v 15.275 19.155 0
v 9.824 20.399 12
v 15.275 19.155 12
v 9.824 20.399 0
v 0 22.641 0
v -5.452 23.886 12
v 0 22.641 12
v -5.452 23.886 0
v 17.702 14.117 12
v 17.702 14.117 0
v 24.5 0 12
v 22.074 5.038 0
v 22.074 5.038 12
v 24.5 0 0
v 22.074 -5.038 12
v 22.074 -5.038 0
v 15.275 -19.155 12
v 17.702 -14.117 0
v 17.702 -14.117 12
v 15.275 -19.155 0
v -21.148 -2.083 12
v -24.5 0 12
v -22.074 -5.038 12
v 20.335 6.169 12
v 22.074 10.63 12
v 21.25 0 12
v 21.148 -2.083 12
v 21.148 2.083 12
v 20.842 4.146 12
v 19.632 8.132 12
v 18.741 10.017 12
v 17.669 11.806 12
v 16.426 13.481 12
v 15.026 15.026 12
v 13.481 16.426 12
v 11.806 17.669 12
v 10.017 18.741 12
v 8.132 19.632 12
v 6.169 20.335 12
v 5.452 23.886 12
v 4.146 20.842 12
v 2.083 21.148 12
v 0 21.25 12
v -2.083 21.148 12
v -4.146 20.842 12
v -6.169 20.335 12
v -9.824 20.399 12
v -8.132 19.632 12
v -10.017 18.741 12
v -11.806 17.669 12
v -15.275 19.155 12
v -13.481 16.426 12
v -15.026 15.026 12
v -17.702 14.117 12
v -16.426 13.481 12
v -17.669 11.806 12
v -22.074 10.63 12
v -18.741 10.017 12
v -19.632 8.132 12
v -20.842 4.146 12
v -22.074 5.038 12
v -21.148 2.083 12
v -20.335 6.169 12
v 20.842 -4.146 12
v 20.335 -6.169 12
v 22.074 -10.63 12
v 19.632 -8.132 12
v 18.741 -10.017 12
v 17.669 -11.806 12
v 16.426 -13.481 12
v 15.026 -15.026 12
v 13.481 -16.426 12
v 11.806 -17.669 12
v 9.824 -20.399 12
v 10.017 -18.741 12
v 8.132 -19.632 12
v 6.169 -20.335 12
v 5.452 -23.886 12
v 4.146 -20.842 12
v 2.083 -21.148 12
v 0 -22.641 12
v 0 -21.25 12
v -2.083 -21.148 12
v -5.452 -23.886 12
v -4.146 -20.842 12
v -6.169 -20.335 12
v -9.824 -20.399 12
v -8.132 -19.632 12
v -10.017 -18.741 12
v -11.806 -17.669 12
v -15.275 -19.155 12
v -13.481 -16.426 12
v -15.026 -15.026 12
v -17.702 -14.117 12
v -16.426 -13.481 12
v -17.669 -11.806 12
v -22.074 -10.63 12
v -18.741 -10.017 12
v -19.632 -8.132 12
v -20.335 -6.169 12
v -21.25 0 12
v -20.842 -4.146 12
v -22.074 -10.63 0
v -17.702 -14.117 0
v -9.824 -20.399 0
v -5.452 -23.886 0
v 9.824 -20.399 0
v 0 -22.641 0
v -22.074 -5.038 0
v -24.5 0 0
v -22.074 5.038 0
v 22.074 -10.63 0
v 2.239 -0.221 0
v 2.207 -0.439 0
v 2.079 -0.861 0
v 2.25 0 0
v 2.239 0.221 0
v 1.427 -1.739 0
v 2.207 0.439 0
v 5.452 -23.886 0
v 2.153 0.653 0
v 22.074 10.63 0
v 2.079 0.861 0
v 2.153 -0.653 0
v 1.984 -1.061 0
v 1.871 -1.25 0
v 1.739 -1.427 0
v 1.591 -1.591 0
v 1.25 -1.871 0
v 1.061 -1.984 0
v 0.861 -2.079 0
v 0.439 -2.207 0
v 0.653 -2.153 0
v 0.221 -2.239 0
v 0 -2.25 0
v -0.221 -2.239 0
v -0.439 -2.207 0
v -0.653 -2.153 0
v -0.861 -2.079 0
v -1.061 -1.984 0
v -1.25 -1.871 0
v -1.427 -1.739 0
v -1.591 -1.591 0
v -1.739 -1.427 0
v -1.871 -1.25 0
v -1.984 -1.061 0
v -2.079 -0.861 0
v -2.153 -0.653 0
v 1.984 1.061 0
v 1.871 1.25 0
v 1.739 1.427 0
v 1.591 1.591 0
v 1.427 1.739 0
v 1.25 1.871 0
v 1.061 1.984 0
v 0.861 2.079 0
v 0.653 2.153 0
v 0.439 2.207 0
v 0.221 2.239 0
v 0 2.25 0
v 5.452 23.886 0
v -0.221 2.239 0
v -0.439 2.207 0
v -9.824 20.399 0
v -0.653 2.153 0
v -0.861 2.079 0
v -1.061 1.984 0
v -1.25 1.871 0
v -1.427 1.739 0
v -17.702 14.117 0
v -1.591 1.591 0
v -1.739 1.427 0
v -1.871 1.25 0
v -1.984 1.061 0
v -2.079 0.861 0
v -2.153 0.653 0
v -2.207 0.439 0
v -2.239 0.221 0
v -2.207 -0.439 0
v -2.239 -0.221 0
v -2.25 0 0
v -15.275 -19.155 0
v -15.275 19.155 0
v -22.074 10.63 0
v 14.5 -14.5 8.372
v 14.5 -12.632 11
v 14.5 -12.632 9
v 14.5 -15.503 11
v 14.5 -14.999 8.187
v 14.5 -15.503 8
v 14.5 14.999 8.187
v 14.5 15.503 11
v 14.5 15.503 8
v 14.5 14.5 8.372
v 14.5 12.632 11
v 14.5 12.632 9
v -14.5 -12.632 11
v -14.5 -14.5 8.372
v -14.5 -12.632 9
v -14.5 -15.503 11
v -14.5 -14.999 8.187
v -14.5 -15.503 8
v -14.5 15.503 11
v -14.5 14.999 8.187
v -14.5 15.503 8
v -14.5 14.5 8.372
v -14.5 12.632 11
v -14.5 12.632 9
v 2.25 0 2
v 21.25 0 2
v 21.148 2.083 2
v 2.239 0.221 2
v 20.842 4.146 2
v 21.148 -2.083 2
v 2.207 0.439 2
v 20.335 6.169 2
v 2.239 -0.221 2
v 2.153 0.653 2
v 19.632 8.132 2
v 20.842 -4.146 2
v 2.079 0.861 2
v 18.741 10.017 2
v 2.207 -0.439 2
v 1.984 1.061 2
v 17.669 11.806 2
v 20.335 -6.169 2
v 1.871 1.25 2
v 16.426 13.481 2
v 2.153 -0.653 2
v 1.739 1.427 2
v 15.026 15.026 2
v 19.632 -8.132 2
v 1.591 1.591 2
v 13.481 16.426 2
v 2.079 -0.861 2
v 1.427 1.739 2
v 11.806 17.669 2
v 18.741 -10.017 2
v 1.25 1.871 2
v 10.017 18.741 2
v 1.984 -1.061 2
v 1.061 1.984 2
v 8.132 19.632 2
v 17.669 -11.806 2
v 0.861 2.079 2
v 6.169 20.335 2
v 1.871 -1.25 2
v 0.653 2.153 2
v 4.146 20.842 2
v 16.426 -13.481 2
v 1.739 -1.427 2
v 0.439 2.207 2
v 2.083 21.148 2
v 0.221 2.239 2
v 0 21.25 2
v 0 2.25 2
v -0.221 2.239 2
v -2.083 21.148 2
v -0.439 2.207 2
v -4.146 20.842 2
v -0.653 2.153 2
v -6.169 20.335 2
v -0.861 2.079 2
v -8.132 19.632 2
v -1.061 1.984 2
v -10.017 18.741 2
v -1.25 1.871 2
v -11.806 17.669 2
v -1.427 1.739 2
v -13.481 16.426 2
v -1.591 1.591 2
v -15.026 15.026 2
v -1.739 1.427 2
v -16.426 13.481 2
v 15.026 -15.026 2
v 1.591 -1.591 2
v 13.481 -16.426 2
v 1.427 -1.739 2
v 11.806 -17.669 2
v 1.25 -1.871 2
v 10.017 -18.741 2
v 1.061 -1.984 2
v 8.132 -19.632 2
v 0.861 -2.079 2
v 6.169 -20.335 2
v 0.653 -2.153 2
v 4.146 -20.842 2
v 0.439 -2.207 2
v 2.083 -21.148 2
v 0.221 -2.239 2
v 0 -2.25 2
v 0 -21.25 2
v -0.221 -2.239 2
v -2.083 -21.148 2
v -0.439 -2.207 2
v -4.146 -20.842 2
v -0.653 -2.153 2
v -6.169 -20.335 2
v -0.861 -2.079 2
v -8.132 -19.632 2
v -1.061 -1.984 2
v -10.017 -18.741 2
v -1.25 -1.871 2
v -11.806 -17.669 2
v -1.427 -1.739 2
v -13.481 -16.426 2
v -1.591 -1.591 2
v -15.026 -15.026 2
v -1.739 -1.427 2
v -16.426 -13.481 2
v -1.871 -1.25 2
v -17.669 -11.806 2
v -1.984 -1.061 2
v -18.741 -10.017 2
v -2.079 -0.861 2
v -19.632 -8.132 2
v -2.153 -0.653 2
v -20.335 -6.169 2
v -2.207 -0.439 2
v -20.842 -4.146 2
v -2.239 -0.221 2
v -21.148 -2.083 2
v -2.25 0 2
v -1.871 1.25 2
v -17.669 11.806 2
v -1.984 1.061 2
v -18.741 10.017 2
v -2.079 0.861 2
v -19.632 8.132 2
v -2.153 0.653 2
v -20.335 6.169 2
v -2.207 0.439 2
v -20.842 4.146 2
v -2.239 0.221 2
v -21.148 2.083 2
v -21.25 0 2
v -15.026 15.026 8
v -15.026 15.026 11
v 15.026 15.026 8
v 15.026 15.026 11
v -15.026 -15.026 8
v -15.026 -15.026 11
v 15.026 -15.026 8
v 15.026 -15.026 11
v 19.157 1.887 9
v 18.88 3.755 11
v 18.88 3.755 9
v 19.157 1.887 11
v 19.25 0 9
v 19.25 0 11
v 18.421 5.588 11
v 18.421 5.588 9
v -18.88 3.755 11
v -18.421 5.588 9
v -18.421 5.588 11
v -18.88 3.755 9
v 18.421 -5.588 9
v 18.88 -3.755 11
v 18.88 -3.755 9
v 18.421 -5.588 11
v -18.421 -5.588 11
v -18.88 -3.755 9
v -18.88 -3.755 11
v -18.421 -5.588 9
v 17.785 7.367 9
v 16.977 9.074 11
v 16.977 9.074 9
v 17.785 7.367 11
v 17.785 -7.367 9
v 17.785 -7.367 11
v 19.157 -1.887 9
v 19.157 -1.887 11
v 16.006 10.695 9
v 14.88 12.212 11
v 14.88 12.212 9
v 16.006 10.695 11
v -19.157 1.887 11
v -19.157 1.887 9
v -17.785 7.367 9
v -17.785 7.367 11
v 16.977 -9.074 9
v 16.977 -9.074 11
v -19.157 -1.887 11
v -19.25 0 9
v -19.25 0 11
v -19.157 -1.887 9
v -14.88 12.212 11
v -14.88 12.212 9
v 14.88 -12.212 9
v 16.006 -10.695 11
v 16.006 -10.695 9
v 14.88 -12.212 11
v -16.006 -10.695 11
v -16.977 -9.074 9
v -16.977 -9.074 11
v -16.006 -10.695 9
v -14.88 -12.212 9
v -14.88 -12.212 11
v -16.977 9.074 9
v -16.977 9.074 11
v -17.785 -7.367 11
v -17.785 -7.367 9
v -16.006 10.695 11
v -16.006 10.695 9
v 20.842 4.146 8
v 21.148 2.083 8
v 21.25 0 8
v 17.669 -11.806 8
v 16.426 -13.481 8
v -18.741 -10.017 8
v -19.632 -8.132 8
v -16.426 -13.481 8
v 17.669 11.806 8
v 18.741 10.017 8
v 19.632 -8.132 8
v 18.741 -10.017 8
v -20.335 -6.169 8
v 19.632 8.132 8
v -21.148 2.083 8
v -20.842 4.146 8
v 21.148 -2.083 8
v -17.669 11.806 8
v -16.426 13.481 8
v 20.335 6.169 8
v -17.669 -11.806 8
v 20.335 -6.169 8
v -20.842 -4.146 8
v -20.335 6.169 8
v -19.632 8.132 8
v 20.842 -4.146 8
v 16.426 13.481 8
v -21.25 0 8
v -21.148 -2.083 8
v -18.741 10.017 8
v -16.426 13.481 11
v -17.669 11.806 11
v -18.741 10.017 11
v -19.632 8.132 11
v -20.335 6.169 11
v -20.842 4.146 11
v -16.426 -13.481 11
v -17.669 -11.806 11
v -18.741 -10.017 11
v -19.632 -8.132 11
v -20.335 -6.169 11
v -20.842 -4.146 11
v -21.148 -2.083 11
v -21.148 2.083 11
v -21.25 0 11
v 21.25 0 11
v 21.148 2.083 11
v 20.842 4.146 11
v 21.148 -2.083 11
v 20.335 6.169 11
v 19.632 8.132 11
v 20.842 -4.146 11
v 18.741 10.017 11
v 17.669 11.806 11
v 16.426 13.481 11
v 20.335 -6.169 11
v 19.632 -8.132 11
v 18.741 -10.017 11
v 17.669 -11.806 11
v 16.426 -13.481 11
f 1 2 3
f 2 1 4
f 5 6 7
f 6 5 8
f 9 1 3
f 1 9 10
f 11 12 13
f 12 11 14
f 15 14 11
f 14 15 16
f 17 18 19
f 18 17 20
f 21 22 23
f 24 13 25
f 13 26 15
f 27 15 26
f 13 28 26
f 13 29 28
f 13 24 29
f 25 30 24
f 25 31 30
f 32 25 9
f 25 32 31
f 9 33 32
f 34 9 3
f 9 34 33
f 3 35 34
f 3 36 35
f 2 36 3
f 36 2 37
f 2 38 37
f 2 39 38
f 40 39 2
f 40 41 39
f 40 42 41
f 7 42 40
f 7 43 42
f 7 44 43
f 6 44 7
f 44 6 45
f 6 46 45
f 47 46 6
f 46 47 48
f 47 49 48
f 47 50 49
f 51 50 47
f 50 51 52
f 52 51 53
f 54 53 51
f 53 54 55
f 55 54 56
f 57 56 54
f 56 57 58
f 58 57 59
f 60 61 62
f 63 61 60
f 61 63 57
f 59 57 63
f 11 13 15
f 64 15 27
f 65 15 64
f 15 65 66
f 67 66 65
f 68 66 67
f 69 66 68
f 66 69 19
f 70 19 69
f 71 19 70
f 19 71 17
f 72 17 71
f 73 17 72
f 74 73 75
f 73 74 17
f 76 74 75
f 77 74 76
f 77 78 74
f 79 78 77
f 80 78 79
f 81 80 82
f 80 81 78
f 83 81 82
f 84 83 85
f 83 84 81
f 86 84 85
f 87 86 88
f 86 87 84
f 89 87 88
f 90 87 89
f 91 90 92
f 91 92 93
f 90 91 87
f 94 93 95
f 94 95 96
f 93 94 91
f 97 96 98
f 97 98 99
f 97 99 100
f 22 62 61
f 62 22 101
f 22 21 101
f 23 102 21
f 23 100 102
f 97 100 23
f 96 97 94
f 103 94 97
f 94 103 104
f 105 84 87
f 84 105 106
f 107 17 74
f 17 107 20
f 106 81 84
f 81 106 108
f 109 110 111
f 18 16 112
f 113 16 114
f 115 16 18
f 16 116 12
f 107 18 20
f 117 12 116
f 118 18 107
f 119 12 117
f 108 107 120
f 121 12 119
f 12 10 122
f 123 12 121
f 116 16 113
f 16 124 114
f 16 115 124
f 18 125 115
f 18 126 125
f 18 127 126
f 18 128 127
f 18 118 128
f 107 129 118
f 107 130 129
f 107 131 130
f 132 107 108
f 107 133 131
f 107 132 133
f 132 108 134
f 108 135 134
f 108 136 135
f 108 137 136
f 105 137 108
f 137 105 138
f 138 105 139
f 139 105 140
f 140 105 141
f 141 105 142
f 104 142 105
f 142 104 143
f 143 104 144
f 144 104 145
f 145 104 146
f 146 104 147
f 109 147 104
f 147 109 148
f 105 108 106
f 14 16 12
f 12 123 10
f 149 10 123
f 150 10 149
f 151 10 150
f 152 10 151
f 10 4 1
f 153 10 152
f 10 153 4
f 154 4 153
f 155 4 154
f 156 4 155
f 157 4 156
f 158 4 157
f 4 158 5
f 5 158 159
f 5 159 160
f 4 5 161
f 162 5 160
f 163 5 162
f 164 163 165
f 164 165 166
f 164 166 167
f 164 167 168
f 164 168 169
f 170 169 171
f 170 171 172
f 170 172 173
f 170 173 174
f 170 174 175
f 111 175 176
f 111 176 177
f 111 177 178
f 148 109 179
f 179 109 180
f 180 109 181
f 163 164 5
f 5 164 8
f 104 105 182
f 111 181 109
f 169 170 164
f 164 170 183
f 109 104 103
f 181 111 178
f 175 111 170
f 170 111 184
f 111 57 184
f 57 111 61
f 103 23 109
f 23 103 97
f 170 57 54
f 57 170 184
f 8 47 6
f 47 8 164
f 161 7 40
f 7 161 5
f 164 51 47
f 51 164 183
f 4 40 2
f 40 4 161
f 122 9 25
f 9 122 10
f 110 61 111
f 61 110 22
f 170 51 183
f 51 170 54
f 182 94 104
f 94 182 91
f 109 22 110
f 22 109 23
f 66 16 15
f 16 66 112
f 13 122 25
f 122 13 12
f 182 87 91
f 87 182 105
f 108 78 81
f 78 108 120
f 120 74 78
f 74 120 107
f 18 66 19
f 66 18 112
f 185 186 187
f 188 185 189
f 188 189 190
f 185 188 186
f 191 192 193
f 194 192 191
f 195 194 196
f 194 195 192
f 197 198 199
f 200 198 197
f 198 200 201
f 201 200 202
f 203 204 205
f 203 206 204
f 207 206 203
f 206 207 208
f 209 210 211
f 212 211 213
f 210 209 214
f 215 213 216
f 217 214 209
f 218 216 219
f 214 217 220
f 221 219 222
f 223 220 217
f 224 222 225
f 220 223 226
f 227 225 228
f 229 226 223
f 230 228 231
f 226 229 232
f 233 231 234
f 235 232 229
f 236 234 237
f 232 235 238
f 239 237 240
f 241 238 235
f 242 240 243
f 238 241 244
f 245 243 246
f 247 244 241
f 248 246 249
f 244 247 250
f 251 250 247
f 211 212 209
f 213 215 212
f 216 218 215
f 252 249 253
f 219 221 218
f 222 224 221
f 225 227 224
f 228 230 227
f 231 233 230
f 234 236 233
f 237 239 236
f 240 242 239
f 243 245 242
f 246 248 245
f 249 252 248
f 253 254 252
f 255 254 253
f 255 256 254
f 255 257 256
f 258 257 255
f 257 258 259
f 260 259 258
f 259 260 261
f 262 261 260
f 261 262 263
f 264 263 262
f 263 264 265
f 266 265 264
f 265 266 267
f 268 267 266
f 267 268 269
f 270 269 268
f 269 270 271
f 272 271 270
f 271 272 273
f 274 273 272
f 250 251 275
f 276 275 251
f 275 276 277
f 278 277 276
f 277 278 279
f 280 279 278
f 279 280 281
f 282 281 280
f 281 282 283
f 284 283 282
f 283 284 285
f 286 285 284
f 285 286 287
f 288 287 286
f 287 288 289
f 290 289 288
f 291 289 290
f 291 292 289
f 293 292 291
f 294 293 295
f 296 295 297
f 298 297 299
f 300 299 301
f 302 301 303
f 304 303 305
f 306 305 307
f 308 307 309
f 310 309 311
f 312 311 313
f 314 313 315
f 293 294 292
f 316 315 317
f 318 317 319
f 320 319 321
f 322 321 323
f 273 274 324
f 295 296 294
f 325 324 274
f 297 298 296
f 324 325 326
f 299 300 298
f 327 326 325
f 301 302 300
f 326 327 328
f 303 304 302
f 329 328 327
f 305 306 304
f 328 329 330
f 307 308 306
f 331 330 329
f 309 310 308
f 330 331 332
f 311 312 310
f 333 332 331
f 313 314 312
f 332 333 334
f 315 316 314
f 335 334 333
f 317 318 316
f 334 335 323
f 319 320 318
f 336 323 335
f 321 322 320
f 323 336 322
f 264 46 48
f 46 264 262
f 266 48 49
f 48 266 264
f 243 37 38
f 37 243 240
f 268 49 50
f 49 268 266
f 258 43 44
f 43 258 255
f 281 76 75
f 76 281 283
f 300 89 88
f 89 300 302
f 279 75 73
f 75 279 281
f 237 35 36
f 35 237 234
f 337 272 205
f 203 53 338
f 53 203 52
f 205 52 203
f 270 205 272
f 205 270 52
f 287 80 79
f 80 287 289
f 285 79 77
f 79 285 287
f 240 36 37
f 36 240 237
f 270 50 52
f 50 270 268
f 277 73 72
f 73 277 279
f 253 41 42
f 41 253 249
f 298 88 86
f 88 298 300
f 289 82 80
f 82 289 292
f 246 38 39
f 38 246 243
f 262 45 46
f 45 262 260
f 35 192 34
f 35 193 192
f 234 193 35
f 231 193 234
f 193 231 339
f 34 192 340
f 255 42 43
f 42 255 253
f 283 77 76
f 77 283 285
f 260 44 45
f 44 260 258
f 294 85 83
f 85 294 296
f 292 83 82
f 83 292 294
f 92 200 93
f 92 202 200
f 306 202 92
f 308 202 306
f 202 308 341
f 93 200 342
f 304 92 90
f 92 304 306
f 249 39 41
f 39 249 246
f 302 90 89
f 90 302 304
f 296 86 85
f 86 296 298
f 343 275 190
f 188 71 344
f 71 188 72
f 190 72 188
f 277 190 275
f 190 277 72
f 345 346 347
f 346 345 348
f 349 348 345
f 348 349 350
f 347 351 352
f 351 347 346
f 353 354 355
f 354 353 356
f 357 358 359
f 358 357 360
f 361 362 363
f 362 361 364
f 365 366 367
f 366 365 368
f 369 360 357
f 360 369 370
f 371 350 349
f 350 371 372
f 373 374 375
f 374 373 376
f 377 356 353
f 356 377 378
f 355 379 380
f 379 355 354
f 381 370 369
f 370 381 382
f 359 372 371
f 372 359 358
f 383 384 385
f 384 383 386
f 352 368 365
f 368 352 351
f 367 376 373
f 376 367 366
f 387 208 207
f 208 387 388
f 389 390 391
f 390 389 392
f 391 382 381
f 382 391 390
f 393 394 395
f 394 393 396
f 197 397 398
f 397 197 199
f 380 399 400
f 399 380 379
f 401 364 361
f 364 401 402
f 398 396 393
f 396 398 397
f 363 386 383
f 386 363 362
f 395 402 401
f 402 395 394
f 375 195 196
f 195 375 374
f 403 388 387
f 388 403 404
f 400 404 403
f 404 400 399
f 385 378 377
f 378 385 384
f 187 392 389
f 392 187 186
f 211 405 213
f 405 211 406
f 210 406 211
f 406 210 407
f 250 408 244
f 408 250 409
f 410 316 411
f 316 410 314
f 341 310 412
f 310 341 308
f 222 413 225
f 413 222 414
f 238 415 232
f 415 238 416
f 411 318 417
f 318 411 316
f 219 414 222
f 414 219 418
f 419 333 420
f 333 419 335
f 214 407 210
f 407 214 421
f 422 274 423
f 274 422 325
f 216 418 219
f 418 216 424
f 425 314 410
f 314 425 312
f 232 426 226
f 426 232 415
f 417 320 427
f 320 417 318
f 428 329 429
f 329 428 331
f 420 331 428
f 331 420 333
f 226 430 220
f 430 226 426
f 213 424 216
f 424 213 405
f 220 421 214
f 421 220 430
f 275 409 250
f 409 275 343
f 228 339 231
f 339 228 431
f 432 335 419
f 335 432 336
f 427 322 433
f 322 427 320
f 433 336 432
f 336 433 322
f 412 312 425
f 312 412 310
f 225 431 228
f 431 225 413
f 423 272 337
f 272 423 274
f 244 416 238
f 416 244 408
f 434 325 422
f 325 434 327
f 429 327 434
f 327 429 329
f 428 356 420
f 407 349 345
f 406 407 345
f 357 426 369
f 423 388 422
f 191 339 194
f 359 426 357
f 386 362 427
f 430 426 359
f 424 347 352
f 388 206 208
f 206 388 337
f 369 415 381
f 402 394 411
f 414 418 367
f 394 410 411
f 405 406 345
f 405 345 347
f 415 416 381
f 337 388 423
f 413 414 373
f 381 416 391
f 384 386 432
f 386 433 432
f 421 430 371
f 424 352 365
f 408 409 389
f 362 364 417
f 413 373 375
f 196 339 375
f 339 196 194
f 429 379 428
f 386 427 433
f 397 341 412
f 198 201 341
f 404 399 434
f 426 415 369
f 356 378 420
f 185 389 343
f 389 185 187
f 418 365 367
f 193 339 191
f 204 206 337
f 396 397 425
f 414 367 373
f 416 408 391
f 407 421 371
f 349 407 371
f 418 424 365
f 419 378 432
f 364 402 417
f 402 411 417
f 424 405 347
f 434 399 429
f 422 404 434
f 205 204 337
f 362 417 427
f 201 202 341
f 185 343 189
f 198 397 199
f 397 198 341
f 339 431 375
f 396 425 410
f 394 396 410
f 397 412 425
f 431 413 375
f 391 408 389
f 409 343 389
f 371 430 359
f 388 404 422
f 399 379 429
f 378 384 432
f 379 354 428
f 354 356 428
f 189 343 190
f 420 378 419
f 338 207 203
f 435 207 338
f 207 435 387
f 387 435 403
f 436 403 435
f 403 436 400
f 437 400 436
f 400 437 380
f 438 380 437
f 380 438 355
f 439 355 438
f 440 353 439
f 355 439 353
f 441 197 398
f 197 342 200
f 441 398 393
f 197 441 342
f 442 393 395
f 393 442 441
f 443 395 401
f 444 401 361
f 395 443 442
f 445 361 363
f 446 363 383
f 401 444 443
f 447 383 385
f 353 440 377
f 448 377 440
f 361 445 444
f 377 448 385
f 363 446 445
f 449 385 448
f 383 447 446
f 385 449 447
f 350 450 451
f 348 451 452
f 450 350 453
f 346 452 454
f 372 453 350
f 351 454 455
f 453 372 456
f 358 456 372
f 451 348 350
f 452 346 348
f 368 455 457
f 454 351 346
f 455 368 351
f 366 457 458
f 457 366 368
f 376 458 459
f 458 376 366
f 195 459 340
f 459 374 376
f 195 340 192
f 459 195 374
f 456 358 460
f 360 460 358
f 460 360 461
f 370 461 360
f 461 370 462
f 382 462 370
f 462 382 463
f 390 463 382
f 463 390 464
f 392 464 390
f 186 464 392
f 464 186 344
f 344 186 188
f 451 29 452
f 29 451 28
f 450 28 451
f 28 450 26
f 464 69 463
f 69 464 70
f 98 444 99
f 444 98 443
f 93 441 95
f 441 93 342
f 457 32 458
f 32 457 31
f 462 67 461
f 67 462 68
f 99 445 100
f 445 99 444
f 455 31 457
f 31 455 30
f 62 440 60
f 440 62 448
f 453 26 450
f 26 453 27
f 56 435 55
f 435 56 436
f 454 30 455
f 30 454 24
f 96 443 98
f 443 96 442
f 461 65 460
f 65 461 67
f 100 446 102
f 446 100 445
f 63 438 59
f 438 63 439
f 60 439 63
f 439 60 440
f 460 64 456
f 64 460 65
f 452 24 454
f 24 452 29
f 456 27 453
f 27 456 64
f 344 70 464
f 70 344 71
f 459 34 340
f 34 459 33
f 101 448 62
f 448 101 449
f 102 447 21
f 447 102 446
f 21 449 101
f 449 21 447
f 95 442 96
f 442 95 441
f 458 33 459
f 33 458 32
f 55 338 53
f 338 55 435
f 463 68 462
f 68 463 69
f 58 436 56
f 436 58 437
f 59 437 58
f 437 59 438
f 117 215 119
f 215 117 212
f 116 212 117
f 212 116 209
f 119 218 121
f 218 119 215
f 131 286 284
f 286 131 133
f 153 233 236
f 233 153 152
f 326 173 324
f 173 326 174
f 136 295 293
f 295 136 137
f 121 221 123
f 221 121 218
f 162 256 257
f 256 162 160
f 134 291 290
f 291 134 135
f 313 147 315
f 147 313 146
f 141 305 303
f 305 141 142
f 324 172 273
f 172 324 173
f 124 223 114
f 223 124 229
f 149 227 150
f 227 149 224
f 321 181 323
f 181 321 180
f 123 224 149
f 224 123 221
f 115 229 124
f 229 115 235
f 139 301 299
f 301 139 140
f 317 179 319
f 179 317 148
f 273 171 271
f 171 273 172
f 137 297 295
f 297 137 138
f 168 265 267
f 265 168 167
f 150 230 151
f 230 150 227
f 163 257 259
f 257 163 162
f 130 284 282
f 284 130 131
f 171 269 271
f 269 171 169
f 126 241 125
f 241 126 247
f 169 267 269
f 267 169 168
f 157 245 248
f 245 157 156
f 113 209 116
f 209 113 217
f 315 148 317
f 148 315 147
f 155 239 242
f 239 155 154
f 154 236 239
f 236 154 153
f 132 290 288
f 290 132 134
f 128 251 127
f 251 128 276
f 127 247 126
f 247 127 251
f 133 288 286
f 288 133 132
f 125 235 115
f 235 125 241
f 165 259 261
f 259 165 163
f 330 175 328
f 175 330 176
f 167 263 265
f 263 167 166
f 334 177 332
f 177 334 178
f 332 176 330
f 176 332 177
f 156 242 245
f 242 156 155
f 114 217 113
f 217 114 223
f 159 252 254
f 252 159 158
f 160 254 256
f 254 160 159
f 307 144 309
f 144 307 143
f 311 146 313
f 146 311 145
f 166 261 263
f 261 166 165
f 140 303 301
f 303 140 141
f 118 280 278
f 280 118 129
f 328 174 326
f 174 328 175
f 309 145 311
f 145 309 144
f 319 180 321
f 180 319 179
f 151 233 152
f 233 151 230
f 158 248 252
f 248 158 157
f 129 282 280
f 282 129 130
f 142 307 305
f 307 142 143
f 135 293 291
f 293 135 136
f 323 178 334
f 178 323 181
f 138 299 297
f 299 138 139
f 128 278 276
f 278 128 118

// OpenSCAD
$fn=64;

difference() {
    union() {
        cylinder(h=12,d=49,$fn=7);
        rotate([0,0,360/14]) cylinder(h=12,d=49,$fn=7);
    }
    translate([0,0,2]) cylinder(h=10,d=38.5);
    translate([0,0,2]) cylinder(h=6,d=42.5);
    translate([0,0,8]) cylinder(h=1,d1=42.5,d2=38.5);
    translate([0,0,11]) cylinder(h=6,d=42.5);
    intersection() {
        cube([29,100,100], center=true);
        translate([0,0,2]) cylinder(h=10,d=42.5);
    }
    cylinder(d=4.5,h=10);
}
